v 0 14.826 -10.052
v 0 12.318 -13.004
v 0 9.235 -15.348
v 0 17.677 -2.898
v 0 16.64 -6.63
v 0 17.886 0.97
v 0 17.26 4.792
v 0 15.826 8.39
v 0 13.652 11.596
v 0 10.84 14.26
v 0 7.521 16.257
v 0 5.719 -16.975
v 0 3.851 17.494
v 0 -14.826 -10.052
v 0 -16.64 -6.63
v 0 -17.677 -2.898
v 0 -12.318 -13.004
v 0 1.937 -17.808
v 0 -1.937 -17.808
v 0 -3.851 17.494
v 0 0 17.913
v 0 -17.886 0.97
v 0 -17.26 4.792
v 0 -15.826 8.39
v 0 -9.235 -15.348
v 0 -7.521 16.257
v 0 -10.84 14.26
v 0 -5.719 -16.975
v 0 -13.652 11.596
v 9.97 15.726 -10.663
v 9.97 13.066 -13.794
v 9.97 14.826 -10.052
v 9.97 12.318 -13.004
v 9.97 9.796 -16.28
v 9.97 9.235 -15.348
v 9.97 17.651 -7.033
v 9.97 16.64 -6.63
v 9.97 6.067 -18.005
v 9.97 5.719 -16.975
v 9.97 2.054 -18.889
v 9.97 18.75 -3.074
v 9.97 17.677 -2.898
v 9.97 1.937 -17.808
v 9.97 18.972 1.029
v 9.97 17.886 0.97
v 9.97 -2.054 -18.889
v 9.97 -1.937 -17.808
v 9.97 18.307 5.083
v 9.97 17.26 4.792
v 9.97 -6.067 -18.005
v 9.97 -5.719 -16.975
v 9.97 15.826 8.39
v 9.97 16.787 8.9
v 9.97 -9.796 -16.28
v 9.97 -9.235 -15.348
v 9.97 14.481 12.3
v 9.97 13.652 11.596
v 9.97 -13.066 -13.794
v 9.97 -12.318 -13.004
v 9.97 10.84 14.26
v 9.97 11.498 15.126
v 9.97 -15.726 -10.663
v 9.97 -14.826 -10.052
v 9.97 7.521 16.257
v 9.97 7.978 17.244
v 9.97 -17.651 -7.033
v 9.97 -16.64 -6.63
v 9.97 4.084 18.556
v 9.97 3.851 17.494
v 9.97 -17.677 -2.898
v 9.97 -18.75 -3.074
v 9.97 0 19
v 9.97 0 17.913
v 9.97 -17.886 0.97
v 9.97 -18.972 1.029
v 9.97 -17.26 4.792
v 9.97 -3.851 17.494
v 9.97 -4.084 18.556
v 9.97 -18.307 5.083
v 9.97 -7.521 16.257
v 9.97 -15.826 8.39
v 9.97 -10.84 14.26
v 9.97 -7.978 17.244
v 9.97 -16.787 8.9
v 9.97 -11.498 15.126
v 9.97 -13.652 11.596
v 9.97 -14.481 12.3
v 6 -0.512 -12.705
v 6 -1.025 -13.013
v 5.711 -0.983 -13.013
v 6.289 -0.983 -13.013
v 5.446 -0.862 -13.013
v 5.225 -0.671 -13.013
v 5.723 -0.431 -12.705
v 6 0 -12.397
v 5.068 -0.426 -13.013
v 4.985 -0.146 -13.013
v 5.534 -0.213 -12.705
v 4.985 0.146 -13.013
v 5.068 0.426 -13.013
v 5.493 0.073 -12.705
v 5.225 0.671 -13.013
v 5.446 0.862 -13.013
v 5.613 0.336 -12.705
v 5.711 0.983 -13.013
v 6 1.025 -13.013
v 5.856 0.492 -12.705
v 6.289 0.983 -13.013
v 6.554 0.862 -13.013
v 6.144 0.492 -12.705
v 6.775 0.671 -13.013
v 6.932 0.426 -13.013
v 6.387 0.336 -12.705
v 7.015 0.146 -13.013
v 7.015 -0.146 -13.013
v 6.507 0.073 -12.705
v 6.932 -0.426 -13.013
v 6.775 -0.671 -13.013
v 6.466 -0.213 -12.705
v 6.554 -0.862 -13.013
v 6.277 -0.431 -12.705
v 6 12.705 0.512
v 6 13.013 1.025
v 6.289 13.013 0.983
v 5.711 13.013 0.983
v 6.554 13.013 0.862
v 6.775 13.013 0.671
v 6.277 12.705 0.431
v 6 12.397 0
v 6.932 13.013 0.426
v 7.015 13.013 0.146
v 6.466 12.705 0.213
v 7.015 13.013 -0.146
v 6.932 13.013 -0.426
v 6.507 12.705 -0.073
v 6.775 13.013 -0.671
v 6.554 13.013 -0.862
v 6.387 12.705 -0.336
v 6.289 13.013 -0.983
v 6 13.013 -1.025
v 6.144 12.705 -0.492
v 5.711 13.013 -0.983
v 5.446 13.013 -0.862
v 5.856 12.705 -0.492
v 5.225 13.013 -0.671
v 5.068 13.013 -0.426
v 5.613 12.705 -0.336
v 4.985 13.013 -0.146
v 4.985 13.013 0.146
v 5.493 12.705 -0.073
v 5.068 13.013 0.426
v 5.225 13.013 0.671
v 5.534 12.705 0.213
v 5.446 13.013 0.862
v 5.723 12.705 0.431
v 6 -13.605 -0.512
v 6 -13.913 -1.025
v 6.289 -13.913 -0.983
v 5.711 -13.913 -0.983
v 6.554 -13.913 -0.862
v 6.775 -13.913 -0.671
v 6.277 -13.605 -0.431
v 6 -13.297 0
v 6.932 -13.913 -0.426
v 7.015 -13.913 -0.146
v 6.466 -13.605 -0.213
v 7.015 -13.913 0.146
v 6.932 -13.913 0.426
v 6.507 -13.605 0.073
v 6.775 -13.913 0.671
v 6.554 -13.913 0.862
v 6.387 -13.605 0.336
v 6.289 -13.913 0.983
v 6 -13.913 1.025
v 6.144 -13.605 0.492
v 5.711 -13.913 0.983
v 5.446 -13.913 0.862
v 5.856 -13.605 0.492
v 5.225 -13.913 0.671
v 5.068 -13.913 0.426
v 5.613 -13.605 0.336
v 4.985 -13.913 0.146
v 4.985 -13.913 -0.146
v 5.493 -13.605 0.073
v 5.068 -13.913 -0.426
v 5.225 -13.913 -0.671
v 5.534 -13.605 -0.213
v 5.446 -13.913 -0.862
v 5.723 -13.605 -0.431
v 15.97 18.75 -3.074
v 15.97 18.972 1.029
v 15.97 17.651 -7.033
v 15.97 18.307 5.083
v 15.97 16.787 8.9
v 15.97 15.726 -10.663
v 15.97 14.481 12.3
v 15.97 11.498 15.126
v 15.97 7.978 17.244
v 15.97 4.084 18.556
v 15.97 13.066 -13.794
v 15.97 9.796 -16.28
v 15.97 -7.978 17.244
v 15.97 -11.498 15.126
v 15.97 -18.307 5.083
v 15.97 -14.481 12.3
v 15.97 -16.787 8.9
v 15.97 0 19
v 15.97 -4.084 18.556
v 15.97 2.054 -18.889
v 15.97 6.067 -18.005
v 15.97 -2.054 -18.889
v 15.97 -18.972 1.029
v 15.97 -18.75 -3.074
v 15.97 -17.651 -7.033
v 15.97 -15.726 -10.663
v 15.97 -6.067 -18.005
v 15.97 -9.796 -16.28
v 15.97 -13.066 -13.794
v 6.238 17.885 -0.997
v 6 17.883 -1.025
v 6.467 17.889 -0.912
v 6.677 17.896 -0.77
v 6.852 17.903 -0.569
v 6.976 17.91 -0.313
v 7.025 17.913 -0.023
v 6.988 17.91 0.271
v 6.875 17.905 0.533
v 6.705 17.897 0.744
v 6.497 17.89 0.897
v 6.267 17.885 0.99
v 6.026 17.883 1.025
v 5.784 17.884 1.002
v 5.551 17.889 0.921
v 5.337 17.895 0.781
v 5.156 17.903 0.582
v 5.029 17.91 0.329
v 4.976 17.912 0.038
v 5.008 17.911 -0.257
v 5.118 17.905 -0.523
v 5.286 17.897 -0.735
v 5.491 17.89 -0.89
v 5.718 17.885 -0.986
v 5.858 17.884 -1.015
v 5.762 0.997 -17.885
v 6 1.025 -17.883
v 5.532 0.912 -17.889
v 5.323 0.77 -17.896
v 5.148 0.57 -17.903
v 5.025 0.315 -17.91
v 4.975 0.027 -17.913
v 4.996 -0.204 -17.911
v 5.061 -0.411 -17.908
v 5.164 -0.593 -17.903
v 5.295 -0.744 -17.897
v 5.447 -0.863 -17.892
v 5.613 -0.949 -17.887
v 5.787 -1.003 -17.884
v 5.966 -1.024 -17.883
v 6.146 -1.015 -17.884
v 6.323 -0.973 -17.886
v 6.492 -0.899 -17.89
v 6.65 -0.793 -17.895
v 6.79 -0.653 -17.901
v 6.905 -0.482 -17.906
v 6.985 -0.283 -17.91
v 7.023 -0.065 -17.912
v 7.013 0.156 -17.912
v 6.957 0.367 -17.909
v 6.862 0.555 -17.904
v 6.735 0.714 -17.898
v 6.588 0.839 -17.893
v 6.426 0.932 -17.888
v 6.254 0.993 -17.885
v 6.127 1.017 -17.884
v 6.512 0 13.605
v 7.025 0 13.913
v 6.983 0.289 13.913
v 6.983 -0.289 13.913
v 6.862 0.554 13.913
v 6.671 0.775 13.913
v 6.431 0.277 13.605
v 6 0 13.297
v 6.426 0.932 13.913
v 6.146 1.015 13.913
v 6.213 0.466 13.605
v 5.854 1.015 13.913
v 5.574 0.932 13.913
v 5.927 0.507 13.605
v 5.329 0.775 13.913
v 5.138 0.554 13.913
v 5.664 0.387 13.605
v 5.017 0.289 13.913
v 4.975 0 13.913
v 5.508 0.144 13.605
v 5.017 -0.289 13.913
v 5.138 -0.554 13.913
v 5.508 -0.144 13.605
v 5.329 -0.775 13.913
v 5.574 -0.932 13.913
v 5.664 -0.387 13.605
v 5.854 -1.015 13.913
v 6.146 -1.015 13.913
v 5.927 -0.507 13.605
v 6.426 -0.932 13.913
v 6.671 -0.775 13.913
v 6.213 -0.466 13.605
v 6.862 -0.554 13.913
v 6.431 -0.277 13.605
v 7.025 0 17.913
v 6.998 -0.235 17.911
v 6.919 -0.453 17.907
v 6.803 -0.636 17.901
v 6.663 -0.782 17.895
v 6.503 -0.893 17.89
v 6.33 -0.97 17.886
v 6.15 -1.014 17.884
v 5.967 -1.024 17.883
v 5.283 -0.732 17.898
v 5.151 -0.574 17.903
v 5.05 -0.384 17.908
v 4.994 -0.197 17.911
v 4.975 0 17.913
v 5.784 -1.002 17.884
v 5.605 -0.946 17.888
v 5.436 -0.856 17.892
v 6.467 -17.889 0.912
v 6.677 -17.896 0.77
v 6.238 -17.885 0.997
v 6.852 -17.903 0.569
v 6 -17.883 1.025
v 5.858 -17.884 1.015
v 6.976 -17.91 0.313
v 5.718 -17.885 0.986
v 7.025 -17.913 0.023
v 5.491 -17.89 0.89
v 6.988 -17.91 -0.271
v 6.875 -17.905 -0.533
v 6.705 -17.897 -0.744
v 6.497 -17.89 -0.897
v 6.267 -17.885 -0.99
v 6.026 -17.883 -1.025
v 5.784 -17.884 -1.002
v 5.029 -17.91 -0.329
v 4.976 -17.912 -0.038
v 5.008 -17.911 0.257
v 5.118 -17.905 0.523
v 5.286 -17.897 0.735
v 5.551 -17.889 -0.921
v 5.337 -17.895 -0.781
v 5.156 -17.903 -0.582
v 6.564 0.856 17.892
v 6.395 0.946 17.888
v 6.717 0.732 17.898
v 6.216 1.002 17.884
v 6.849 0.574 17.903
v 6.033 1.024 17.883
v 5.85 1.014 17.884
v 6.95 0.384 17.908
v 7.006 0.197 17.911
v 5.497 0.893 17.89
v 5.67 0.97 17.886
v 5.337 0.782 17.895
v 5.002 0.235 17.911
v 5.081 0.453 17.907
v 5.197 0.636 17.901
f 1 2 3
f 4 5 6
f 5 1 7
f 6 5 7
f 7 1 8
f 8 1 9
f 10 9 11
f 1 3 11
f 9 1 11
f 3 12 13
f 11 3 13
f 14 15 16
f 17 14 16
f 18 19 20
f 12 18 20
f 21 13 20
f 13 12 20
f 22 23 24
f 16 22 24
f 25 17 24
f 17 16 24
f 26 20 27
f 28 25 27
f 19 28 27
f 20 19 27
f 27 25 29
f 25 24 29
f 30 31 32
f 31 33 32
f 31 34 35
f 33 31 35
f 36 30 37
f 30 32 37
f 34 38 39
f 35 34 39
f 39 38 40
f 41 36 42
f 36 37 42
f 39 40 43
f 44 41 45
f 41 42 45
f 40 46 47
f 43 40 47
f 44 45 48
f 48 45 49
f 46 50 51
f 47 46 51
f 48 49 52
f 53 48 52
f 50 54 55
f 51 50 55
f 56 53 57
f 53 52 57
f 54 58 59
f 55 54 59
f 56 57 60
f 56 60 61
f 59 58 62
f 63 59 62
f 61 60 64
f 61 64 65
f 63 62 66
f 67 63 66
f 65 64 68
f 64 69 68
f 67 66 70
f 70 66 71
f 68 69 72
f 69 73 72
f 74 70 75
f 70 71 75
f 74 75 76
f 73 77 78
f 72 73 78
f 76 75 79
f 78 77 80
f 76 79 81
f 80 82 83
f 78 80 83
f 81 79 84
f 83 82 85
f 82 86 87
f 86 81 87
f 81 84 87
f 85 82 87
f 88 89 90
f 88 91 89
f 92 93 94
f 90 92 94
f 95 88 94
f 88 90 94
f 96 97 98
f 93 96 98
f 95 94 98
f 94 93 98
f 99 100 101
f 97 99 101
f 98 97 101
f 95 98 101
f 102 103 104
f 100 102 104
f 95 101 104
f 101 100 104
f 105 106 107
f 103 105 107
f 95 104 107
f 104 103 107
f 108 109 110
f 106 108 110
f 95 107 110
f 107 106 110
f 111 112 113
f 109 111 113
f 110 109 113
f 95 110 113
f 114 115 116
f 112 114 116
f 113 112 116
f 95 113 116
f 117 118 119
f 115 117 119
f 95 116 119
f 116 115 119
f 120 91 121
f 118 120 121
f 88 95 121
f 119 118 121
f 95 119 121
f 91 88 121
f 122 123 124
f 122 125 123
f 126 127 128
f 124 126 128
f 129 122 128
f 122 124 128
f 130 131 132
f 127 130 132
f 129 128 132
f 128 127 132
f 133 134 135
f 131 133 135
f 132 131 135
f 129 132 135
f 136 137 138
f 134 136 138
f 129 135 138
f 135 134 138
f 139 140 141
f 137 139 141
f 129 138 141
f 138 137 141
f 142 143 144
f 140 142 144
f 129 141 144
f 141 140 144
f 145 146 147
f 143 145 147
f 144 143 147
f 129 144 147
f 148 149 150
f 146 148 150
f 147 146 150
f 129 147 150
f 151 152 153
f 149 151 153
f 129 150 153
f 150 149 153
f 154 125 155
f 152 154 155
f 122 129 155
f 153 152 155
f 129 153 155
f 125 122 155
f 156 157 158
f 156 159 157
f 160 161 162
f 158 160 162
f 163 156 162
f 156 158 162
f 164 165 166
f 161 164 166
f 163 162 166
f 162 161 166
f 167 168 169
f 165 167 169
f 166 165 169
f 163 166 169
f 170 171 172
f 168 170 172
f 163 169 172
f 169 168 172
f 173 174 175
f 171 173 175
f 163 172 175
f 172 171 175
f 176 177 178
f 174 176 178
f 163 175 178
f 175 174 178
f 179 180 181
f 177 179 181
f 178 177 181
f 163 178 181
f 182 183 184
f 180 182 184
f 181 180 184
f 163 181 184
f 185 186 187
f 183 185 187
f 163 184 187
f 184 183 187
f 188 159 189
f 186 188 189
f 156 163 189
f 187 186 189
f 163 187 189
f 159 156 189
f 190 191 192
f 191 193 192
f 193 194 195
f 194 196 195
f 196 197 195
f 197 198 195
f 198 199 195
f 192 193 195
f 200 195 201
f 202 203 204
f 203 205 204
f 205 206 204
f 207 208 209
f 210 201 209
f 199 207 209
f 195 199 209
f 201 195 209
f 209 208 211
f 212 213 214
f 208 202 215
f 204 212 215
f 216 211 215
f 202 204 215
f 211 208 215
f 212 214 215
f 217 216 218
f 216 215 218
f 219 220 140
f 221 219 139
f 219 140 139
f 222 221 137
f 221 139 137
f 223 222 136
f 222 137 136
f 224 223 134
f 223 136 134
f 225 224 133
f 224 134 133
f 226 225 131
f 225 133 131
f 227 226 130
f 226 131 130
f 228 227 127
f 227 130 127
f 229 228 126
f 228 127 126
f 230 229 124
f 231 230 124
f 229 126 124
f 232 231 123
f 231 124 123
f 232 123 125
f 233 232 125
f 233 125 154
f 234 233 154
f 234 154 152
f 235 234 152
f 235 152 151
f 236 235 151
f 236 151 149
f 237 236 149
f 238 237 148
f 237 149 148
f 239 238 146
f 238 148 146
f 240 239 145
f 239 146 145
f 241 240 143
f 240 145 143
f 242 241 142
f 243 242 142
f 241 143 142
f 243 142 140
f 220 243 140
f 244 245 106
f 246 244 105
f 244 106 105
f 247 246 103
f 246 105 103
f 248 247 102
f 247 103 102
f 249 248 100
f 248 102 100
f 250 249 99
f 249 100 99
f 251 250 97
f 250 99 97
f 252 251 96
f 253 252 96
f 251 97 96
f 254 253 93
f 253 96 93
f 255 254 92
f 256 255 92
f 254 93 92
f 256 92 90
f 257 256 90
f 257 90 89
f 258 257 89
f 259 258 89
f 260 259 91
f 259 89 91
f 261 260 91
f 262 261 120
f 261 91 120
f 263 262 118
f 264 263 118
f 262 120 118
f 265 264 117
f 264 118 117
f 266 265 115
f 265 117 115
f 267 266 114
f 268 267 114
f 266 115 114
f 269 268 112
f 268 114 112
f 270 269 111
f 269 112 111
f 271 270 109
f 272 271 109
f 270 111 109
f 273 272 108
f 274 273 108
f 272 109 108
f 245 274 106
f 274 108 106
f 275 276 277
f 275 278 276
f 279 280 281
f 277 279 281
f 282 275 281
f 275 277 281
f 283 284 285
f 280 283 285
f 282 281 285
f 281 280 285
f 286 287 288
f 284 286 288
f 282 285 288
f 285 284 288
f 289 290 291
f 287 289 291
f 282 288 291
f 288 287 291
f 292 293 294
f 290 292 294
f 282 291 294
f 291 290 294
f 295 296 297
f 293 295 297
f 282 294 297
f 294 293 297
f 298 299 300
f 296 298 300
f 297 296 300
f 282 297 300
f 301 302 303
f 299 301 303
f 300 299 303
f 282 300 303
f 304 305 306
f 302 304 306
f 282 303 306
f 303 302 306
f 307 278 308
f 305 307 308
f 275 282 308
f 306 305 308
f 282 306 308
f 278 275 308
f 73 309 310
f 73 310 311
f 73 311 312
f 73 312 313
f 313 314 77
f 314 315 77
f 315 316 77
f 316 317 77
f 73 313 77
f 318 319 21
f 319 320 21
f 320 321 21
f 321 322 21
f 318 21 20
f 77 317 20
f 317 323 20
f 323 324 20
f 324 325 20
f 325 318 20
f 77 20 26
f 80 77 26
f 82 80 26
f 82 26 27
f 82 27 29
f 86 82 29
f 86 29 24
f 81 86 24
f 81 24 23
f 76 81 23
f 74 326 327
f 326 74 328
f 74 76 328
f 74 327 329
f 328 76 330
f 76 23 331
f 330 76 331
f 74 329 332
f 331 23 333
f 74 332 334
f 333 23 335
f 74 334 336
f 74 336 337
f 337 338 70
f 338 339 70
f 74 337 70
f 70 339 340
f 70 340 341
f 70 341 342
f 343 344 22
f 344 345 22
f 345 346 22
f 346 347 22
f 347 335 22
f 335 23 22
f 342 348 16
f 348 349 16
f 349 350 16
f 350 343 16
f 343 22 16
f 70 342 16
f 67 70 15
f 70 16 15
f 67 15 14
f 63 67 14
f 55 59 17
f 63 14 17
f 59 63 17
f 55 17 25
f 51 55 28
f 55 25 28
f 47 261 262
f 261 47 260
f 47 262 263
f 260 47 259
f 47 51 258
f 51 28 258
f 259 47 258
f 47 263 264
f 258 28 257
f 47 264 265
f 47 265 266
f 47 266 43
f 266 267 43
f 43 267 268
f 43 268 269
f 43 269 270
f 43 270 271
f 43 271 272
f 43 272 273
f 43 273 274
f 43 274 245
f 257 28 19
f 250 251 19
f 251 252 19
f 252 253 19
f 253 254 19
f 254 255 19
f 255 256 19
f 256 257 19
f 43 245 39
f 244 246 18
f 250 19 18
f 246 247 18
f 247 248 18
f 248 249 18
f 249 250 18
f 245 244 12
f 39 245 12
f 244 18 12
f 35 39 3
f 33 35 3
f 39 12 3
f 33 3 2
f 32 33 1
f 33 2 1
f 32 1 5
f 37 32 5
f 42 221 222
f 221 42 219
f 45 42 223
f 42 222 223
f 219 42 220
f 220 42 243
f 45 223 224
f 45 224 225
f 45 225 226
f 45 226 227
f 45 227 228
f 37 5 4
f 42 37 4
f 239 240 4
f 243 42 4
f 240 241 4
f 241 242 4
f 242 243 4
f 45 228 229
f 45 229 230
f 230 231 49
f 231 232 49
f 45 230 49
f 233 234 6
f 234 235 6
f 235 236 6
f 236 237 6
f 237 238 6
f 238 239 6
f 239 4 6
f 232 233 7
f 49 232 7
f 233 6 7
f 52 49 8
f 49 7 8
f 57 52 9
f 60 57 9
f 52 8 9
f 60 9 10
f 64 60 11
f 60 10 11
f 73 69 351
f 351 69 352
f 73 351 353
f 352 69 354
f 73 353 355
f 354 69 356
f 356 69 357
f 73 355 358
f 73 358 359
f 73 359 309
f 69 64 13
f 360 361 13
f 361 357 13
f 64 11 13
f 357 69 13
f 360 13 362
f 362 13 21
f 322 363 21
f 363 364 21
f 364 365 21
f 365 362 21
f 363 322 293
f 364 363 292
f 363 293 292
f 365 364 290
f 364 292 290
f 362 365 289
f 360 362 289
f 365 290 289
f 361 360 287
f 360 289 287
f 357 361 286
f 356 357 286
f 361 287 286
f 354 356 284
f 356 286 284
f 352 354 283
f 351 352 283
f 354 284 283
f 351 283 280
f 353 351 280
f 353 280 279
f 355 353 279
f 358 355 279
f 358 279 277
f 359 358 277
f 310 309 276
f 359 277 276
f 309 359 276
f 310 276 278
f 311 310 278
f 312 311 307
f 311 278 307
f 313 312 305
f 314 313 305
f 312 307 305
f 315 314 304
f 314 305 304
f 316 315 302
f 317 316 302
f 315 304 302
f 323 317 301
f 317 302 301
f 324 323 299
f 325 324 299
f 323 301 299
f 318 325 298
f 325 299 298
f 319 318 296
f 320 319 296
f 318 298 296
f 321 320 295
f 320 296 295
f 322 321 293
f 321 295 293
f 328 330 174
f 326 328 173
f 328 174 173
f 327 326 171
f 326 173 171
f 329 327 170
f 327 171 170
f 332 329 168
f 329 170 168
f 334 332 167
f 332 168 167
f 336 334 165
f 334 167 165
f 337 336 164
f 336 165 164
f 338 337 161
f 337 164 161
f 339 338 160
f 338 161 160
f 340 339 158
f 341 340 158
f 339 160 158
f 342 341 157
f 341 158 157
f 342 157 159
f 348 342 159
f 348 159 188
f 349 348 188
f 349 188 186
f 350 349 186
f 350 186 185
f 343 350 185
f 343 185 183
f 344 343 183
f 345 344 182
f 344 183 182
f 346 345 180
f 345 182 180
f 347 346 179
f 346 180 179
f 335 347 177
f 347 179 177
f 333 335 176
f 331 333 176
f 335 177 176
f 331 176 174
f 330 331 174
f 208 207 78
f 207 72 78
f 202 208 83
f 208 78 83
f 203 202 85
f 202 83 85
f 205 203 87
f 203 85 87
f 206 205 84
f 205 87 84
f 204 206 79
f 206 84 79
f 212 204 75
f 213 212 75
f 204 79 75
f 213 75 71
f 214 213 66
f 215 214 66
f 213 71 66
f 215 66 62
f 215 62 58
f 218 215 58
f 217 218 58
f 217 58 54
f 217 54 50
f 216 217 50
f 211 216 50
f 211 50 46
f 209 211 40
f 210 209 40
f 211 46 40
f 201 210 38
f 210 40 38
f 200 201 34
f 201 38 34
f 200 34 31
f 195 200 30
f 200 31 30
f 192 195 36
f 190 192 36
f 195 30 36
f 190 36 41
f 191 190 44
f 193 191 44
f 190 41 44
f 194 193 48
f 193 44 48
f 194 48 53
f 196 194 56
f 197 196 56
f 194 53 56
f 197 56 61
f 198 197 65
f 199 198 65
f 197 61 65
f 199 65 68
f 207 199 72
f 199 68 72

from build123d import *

# Parameters (mm, degrees)
M2_5_TAPPED_HOLE1_D               = 2.05
M2_5_TAPPED_HOLE1_DEPTH           = 4
M2_5_TAPPED_HOLE1_TIP             = 0.615882135
M2_5_TAPPED_HOLE1_ON_FACE_2_D     = 2.05
M2_5_TAPPED_HOLE1_ON_FACE_2_DEPTH = 4
M2_5_TAPPED_HOLE1_ON_FACE_2_TIP   = 0.615882135
M2_5_TAPPED_HOLE1_ON_FACE_3_D     = 2.05
M2_5_TAPPED_HOLE1_ON_FACE_3_DEPTH = 4
M2_5_TAPPED_HOLE1_ON_FACE_3_TIP   = 0.615882135
M2_5_TAPPED_HOLE2_D               = 2.05
M2_5_TAPPED_HOLE2_DEPTH           = 4.9
M2_5_TAPPED_HOLE2_TIP             = 0.615882135
M2_5_TAPPED_HOLE2_ON_FACE_2_D     = 2.05
M2_5_TAPPED_HOLE2_ON_FACE_2_DEPTH = 4.9
M2_5_TAPPED_HOLE2_ON_FACE_2_TIP   = 0.615882135


with BuildPart() as part:
    # Sketch1 → Revolve1 (revolve)
    with BuildSketch(Plane.XY, mode=Mode.PRIVATE) as revolve1_sk:
        Polygon((0, 17.8825346), (0, 0), (15.97, 0), (15.97, 17), (15.97, 19), (9.97, 19), (9.97, 17.9125346), (0, 17.9125346), align=None)
    revolve(revolve1_sk.sketch.rotate(Axis((-76.24269061, 0, 0), (1, 0, 0)), 90), axis=Axis((-76.24269061, 0, 0), (1, 0, 0)))

    # M2.5 Tapped Hole1
    with Locations(Plane(origin=(6, -17.9125346, 0), x_dir=(0, 0, -1), z_dir=(0, -1, 0))):
        with Locations((0, 0)):
            Hole(M2_5_TAPPED_HOLE1_D / 2, depth=M2_5_TAPPED_HOLE1_DEPTH)
            with Locations((0, 0, -(M2_5_TAPPED_HOLE1_DEPTH + M2_5_TAPPED_HOLE1_TIP / 2))):  # 118° drill point
                Cone(0, M2_5_TAPPED_HOLE1_D / 2, M2_5_TAPPED_HOLE1_TIP, mode=Mode.SUBTRACT)

    # M2.5 Tapped Hole1 on face 2
    with Locations(Plane(origin=(6, 0, 17.9125346), x_dir=(1, 0, 0), z_dir=(0, 0, 1))):
        with Locations((0, 0)):
            Hole(M2_5_TAPPED_HOLE1_ON_FACE_2_D / 2, depth=M2_5_TAPPED_HOLE1_ON_FACE_2_DEPTH)
            with Locations((0, 0, -(M2_5_TAPPED_HOLE1_ON_FACE_2_DEPTH + M2_5_TAPPED_HOLE1_ON_FACE_2_TIP / 2))):  # 118° drill point
                Cone(0, M2_5_TAPPED_HOLE1_ON_FACE_2_D / 2, M2_5_TAPPED_HOLE1_ON_FACE_2_TIP, mode=Mode.SUBTRACT)

    # M2.5 Tapped Hole1 on face 3
    with Locations(Plane(origin=(-38.298616193, 0, -8.034883706), x_dir=(0, 0, -1), z_dir=(0, -1, 0))):
        with Locations((0, 0)):
            Hole(M2_5_TAPPED_HOLE1_ON_FACE_3_D / 2, depth=M2_5_TAPPED_HOLE1_ON_FACE_3_DEPTH)
            with Locations((0, 0, -(M2_5_TAPPED_HOLE1_ON_FACE_3_DEPTH + M2_5_TAPPED_HOLE1_ON_FACE_3_TIP / 2))):  # 118° drill point
                Cone(0, M2_5_TAPPED_HOLE1_ON_FACE_3_D / 2, M2_5_TAPPED_HOLE1_ON_FACE_3_TIP, mode=Mode.SUBTRACT)

    # M2.5 Tapped Hole2
    with Locations(Plane(origin=(6, 0, -17.9125346), x_dir=(0, -1, 0), z_dir=(0, 0, -1))):
        with Locations((0, 0)):
            Hole(M2_5_TAPPED_HOLE2_D / 2, depth=M2_5_TAPPED_HOLE2_DEPTH)
            with Locations((0, 0, -(M2_5_TAPPED_HOLE2_DEPTH + M2_5_TAPPED_HOLE2_TIP / 2))):  # 118° drill point
                Cone(0, M2_5_TAPPED_HOLE2_D / 2, M2_5_TAPPED_HOLE2_TIP, mode=Mode.SUBTRACT)

    # M2.5 Tapped Hole2 on face 2
    with Locations(Plane(origin=(6, 17.9125346, 0), x_dir=(0, 0, 1), z_dir=(0, 1, 0))):
        with Locations((0, 0)):
            Hole(M2_5_TAPPED_HOLE2_ON_FACE_2_D / 2, depth=M2_5_TAPPED_HOLE2_ON_FACE_2_DEPTH)
            with Locations((0, 0, -(M2_5_TAPPED_HOLE2_ON_FACE_2_DEPTH + M2_5_TAPPED_HOLE2_ON_FACE_2_TIP / 2))):  # 118° drill point
                Cone(0, M2_5_TAPPED_HOLE2_ON_FACE_2_D / 2, M2_5_TAPPED_HOLE2_ON_FACE_2_TIP, mode=Mode.SUBTRACT)


solid = part.part
